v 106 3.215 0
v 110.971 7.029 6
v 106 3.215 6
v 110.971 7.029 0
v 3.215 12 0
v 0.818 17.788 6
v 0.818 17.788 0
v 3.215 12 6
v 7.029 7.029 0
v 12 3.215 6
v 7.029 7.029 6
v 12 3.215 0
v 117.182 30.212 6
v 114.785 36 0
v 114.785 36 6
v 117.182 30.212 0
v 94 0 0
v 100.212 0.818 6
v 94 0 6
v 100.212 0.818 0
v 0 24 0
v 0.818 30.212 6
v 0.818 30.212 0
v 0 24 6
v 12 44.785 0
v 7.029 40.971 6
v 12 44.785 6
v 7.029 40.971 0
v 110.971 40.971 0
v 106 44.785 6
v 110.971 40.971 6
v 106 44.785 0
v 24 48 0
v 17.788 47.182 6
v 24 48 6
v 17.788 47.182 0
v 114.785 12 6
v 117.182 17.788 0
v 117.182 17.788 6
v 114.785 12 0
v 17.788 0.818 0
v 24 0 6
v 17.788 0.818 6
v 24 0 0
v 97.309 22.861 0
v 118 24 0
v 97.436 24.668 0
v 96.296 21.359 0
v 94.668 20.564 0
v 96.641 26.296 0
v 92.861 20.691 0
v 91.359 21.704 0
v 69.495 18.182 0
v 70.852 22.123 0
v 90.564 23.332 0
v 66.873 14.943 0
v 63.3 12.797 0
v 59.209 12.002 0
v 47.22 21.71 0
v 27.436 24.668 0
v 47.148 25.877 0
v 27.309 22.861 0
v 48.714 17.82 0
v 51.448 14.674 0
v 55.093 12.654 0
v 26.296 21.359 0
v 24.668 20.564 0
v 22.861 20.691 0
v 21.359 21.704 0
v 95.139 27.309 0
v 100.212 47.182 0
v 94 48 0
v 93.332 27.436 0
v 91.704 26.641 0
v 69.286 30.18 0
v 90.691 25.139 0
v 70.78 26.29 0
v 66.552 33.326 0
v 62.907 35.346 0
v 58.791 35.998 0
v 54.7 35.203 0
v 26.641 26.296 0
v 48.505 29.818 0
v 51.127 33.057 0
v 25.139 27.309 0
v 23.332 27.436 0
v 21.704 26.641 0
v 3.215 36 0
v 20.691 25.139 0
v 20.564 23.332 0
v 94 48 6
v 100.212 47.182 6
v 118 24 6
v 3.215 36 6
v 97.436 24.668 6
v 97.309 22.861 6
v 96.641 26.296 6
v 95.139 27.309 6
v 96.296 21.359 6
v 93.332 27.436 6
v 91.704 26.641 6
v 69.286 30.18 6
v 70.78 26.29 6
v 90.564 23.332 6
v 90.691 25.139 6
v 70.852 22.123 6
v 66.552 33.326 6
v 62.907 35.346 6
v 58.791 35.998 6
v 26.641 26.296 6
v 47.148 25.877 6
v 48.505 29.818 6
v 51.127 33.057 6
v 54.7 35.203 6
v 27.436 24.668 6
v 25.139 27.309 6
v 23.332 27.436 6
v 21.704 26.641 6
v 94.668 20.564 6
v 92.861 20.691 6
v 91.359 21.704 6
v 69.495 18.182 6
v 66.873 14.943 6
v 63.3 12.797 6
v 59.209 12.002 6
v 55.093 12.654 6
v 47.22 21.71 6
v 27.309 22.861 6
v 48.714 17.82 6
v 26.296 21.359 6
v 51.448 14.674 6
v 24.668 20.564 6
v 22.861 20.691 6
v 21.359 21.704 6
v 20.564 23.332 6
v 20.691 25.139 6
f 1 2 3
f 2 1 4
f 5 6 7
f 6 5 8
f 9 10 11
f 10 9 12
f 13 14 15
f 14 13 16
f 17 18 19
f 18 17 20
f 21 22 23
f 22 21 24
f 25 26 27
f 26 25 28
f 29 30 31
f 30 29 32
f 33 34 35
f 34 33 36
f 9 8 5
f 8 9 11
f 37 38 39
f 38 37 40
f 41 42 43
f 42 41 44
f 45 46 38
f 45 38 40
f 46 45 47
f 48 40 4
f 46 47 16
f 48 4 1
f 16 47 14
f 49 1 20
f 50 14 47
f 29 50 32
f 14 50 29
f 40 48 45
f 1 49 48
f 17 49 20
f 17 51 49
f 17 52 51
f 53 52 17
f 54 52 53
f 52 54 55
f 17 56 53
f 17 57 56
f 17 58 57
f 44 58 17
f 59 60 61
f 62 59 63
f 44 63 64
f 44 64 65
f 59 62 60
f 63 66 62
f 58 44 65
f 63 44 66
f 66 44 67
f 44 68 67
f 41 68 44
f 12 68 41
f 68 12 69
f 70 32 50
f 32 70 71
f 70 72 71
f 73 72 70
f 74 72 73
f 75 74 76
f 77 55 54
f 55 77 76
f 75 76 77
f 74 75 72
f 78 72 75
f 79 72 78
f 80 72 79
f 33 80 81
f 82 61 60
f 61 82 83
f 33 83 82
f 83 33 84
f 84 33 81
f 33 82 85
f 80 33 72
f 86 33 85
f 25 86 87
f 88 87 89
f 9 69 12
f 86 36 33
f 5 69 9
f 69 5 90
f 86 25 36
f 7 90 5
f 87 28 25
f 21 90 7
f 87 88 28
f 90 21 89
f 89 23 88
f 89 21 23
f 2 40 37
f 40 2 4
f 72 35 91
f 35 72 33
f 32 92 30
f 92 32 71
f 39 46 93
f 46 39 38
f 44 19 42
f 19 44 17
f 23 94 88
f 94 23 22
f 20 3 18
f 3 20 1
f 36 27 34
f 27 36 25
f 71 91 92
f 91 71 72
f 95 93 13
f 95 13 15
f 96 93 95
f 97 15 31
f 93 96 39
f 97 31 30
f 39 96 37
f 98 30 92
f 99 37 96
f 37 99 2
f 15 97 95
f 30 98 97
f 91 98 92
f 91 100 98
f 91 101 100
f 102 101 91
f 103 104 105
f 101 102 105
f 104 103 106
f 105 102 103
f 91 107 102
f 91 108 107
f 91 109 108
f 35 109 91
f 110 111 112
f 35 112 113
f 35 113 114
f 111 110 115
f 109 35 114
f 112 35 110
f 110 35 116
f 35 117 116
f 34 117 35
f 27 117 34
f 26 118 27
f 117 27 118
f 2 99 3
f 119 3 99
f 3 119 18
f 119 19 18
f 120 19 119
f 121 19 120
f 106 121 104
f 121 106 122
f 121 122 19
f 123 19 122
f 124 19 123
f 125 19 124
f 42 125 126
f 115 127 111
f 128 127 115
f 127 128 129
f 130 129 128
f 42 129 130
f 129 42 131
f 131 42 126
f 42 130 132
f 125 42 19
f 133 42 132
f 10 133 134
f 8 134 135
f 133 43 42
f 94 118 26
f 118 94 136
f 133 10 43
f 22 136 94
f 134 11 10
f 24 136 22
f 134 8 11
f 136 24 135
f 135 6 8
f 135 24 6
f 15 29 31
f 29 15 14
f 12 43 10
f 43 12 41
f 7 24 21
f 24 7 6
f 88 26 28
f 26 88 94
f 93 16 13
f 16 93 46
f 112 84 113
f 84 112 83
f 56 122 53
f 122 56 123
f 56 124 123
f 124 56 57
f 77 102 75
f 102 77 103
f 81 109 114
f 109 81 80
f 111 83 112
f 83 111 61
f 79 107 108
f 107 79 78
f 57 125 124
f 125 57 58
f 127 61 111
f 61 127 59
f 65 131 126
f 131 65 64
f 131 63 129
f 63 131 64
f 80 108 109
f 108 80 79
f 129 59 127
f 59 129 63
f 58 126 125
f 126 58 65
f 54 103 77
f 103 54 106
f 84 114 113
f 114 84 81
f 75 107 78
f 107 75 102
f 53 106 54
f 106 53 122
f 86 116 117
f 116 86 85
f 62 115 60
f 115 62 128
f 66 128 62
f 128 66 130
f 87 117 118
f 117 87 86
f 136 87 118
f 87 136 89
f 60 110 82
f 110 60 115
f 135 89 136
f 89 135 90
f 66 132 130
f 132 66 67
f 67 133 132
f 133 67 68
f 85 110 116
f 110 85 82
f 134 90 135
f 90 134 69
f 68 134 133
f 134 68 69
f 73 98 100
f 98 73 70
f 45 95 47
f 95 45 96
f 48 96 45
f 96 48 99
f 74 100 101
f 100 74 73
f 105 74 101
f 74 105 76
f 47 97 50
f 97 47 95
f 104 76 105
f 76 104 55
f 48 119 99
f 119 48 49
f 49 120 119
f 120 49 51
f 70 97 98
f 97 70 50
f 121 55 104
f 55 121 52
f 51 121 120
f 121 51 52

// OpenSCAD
$fn = 32;

// ----------------------------------------------------------------------
// Spacer plate: obround span 70, caps R24
// ----------------------------------------------------------------------

// --- parameters (mm) ---
bore_r = 12;              // centre bore radius
bolt_r = 3.5;             // bolt hole radius
plate_t = 6;              // plate thickness, Z (extrusion height)
span = 70;                // obround span
cap_r = 24;               // cap radius

profile = [[24, 48], [17.788, 47.182], [12, 44.785], [7.029, 40.971], [3.215, 36], [0.818, 30.212], [0, 24], [0.818, 17.788], [3.215, 12], [7.029, 7.029], [12, 3.215], [17.788, 0.818], [24, 0], [94, 0], [100.212, 0.818], [106, 3.215], [110.971, 7.029], [114.785, 12], [117.182, 17.788], [118, 24], [117.182, 30.212], [114.785, 36], [110.971, 40.971], [106, 44.785], [100.212, 47.182], [94, 48]];  // primary outline, 26 points, counter clockwise
void_1 = [[70.78, 26.29], [69.286, 30.18], [66.552, 33.326], [62.907, 35.346], [58.791, 35.998], [54.7, 35.203], [51.127, 33.057], [48.505, 29.818], [47.148, 25.877], [47.22, 21.71], [48.714, 17.82], [51.448, 14.674], [55.093, 12.654], [59.209, 12.002], [63.3, 12.797], [66.873, 14.943], [69.495, 18.182], [70.852, 22.123]];  // centre bore, 18 points
void_2 = [[27.436, 24.668], [26.641, 26.296], [25.139, 27.309], [23.332, 27.436], [21.704, 26.641], [20.691, 25.139], [20.564, 23.332], [21.359, 21.704], [22.861, 20.691], [24.668, 20.564], [26.296, 21.359], [27.309, 22.861]];  // end hole, 12 points
void_3 = [[97.436, 24.668], [96.641, 26.296], [95.139, 27.309], [93.332, 27.436], [91.704, 26.641], [90.691, 25.139], [90.564, 23.332], [91.359, 21.704], [92.861, 20.691], [94.668, 20.564], [96.296, 21.359], [97.309, 22.861]];  // end hole, 12 points

// --- the one profile operation ---
difference() {
  linear_extrude(height = plate_t) polygon(points = profile);
  translate([0, 0, -1])
    linear_extrude(height = plate_t + 2) polygon(points = void_1);
  translate([0, 0, -1])
    linear_extrude(height = plate_t + 2) polygon(points = void_2);
  translate([0, 0, -1])
    linear_extrude(height = plate_t + 2) polygon(points = void_3);
}
